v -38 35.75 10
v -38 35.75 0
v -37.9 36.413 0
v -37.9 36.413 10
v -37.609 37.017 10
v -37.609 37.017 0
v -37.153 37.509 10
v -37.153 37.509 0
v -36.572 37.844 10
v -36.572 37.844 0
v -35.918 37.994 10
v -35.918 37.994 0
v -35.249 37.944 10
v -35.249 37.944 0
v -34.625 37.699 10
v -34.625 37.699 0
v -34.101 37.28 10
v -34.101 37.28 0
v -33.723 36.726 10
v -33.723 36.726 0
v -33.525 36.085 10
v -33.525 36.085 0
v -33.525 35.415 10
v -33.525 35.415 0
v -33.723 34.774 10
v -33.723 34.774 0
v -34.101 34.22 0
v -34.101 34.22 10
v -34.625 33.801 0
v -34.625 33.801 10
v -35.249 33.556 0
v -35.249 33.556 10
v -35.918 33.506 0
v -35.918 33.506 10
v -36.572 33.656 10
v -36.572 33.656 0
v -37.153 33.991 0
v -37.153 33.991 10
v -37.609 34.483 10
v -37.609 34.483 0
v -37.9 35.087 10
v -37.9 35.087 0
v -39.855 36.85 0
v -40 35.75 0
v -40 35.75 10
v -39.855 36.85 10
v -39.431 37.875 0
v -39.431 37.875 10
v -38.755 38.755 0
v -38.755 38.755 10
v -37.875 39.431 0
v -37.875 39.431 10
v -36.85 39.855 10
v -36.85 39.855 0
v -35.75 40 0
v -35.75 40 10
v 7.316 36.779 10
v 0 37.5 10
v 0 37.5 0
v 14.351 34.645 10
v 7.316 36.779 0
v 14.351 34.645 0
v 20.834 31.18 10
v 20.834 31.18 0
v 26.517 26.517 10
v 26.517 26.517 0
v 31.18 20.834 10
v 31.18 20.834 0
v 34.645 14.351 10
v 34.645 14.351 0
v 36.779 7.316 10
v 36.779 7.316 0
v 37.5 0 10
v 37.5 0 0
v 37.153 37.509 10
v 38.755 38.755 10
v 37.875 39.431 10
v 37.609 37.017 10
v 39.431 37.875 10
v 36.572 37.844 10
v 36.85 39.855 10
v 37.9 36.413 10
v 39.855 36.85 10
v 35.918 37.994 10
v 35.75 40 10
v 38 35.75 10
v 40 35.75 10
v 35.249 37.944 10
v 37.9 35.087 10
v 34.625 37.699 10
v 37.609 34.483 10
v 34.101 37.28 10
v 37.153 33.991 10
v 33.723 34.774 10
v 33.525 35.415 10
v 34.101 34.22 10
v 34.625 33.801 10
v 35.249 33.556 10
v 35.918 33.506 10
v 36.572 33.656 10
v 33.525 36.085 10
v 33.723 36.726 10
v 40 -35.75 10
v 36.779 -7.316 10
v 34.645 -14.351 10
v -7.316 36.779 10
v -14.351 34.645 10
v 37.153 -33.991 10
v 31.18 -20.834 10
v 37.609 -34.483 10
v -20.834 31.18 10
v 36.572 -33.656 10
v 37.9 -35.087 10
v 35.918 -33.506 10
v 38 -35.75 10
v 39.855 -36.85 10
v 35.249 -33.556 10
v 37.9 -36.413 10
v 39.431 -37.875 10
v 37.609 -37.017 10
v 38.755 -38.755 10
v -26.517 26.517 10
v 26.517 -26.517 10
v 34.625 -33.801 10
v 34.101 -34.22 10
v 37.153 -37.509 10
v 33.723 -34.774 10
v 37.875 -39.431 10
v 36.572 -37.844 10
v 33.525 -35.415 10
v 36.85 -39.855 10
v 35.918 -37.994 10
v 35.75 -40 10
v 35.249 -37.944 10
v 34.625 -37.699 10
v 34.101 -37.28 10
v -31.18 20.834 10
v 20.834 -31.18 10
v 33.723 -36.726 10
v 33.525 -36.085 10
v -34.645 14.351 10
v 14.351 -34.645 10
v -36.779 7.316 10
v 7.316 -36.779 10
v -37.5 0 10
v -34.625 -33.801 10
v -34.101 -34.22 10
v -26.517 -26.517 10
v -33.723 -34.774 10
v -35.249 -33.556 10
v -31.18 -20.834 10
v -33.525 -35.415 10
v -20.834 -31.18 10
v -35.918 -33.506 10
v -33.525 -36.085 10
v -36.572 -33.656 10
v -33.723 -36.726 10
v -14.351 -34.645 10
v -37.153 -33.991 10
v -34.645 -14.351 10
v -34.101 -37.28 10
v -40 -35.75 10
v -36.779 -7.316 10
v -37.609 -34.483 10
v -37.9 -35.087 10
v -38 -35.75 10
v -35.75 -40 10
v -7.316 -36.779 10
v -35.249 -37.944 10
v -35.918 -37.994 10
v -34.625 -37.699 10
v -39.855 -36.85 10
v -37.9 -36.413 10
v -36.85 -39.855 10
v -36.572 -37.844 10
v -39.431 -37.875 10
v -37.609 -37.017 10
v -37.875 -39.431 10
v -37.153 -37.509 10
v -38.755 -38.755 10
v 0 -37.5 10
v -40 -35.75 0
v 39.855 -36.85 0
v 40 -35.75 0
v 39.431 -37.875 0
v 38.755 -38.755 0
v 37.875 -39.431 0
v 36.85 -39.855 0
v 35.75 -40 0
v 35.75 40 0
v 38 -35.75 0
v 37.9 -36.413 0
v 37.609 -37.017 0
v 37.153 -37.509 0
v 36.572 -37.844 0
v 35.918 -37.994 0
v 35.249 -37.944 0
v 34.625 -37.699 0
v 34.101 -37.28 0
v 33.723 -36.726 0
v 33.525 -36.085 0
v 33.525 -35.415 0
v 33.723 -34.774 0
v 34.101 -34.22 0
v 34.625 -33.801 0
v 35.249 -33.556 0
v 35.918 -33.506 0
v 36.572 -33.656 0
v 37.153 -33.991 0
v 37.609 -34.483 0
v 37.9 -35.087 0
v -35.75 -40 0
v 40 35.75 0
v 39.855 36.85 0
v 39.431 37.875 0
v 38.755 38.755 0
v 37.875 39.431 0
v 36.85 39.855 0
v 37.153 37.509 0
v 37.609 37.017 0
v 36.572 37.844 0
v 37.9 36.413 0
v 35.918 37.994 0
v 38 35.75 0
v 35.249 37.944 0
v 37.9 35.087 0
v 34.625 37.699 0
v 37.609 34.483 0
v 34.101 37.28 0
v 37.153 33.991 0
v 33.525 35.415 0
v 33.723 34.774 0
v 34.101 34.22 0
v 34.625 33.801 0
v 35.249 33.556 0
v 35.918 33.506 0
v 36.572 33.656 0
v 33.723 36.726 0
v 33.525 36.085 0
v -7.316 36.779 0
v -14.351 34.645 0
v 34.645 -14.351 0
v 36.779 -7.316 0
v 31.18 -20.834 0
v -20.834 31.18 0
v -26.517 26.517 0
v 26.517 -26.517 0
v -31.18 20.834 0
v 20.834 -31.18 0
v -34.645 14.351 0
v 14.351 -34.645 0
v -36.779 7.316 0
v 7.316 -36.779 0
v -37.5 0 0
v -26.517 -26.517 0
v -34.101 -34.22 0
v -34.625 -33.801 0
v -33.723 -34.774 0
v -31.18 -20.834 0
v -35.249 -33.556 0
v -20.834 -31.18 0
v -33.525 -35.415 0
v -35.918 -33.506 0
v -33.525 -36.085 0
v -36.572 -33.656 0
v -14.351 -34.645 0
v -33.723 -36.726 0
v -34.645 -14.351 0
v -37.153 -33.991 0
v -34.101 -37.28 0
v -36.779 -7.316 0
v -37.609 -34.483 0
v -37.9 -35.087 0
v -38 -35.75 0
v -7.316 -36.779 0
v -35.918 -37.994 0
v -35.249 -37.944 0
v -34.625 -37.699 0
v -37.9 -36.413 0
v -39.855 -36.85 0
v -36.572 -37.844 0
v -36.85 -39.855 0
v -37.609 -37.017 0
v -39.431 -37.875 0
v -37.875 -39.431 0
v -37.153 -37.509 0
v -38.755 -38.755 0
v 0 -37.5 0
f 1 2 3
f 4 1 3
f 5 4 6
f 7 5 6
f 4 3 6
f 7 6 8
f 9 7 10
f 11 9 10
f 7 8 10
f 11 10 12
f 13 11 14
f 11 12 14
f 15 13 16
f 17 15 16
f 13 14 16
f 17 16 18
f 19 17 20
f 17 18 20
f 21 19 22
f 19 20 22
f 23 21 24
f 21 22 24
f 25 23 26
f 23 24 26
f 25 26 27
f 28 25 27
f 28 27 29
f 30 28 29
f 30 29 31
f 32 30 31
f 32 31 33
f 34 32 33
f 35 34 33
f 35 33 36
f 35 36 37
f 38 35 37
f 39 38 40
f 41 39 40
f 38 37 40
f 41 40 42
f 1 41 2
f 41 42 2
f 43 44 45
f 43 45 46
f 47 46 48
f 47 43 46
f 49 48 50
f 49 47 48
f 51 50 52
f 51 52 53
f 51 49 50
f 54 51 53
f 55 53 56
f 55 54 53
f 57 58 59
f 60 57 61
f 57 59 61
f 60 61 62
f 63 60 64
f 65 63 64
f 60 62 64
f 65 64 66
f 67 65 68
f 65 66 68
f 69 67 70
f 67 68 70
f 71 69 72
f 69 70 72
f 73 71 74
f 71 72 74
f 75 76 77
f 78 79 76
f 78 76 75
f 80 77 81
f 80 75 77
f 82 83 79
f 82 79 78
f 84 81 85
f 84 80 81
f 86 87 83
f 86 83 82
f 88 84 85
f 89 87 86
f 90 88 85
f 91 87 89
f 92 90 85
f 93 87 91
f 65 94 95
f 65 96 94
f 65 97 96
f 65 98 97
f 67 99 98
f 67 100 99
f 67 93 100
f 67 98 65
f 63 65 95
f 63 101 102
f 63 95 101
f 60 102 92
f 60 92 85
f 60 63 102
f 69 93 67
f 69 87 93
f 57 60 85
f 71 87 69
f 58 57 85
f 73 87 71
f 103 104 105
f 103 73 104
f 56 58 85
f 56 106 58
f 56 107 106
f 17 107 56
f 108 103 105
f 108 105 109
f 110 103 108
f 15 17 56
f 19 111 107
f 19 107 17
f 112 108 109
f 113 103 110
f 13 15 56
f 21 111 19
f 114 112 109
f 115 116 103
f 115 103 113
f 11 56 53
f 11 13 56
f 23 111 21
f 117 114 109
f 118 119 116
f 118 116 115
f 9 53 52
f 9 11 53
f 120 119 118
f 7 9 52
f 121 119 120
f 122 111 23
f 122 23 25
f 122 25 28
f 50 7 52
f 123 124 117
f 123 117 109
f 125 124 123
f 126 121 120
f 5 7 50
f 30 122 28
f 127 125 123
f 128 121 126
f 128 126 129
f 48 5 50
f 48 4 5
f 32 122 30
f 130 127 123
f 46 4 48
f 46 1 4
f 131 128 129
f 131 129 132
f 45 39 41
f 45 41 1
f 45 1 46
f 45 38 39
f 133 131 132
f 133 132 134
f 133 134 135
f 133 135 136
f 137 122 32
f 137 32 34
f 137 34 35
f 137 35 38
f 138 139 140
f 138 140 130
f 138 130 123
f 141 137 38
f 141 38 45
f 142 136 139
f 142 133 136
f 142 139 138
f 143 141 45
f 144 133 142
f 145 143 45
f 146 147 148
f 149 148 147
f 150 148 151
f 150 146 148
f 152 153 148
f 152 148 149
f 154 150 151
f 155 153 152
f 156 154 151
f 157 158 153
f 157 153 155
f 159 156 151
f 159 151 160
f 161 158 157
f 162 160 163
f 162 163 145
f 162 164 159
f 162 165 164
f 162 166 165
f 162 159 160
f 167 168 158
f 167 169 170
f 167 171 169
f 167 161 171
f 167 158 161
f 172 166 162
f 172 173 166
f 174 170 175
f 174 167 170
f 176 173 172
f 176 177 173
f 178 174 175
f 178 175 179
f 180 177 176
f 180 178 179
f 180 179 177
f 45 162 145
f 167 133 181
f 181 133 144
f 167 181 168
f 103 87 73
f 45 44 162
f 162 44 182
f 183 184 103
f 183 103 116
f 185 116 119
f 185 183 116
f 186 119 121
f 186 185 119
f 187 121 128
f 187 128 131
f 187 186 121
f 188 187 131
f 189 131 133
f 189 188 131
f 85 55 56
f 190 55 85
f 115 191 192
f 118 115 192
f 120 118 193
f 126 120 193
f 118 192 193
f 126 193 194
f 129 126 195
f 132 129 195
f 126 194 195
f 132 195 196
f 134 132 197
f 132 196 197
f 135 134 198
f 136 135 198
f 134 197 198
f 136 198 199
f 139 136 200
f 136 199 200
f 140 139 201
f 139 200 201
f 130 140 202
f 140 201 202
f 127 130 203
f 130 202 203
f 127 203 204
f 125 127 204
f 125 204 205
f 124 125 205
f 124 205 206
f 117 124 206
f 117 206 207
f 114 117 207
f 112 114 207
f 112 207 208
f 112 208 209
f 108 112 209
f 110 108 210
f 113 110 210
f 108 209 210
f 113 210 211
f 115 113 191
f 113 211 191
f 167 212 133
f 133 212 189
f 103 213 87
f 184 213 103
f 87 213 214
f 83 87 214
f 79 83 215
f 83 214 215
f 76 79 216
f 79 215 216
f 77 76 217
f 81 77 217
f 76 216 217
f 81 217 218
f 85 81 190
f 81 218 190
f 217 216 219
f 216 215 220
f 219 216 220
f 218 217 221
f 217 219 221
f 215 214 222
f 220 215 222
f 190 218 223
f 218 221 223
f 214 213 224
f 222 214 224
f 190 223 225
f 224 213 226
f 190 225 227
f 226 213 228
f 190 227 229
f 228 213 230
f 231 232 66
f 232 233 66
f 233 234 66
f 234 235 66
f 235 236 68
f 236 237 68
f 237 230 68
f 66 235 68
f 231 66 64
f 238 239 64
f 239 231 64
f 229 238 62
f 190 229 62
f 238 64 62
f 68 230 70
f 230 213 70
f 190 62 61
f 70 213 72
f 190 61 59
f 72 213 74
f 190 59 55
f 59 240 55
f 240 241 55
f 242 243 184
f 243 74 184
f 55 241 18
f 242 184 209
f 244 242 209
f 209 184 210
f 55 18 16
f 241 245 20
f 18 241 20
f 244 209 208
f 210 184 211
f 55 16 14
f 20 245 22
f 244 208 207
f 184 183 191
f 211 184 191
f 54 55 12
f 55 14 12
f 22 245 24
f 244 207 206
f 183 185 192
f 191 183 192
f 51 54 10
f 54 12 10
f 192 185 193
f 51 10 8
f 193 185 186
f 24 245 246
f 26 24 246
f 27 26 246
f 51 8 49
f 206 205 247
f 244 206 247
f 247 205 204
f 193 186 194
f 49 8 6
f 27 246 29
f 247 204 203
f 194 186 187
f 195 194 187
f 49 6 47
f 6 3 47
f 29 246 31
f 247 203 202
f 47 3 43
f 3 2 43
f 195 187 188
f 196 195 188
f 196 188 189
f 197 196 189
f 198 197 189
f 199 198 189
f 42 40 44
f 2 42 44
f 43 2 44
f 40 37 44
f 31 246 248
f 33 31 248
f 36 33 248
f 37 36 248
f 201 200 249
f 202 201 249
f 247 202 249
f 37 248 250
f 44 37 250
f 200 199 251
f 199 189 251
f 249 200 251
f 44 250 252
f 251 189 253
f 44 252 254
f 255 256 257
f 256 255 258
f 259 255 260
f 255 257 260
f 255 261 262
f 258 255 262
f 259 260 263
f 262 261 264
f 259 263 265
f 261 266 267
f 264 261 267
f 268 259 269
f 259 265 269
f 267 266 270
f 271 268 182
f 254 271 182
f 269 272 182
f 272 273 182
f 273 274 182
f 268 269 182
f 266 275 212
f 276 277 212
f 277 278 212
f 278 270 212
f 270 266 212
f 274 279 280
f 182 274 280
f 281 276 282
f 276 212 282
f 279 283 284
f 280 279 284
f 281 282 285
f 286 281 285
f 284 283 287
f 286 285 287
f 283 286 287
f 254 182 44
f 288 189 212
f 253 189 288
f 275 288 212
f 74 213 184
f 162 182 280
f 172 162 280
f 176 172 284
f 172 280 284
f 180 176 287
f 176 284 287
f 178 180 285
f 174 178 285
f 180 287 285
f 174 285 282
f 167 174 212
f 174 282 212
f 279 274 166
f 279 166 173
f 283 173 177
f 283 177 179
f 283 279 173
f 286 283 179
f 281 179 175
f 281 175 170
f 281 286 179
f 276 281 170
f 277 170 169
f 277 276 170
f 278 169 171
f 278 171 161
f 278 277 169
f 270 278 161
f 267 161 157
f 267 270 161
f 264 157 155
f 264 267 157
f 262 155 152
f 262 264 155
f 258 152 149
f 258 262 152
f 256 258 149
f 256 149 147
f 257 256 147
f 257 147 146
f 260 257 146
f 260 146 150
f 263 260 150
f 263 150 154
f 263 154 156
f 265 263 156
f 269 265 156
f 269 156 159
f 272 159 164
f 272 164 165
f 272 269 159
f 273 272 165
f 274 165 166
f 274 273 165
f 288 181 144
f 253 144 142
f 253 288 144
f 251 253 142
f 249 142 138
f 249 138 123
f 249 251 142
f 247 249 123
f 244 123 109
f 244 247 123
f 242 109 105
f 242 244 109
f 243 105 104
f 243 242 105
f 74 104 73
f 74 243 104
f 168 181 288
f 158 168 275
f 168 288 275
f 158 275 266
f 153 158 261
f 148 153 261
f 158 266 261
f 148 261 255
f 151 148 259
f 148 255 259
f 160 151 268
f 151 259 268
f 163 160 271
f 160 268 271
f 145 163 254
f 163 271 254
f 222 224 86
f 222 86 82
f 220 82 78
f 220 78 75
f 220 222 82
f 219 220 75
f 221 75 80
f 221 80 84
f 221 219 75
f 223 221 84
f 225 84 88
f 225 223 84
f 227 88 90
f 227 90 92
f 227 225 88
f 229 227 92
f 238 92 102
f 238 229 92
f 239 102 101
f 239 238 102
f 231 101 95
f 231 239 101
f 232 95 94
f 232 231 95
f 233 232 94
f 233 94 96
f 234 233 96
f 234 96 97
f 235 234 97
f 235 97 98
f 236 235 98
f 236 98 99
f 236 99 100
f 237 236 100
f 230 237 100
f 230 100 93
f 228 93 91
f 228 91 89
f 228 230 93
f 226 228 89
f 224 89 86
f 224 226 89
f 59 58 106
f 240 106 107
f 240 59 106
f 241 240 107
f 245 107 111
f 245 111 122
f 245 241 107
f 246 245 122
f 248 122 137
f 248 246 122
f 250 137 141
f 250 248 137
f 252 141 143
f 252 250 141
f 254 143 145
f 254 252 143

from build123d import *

# Parameters (mm, degrees)
F0_R     = 2.25
F1_DEPTH = 10


with BuildPart() as f1:
    # F0 (on Top) → F1 (new body)
    with BuildSketch(Plane.XY):
        with BuildLine():
            ThreePointArc((0, 37.5), (26.516504, 26.516504), (37.5, 0))
            Line((37.5, 0), (40, 0))
            Line((40, 0), (40, 35.75))
            ThreePointArc((40, 35.75), (38.755204, 38.755204), (35.75, 40))
            Line((35.75, 40), (0, 40))
            Line((0, 40), (0, 37.5))
        make_face()
        with Locations((35.75, 35.75)):
            Circle(F0_R, mode=Mode.SUBTRACT)
    extrude(amount=F1_DEPTH)

    # F2: F1 across face


with BuildPart() as f1_1:
    add(f1.part)
    add(f1.part.mirror(Plane(origin=(38.75, 0, 5), x_dir=(1, 0, 0), z_dir=(0, -1, 0))))

    # F3: F1 across face


with BuildPart() as f1_2:
    add(f1_1.part)
    add(f1_1.part.mirror(Plane(origin=(0, 38.75, 5), x_dir=(0, -1, 0), z_dir=(-1, 0, 0))))


solid = f1_2.part
